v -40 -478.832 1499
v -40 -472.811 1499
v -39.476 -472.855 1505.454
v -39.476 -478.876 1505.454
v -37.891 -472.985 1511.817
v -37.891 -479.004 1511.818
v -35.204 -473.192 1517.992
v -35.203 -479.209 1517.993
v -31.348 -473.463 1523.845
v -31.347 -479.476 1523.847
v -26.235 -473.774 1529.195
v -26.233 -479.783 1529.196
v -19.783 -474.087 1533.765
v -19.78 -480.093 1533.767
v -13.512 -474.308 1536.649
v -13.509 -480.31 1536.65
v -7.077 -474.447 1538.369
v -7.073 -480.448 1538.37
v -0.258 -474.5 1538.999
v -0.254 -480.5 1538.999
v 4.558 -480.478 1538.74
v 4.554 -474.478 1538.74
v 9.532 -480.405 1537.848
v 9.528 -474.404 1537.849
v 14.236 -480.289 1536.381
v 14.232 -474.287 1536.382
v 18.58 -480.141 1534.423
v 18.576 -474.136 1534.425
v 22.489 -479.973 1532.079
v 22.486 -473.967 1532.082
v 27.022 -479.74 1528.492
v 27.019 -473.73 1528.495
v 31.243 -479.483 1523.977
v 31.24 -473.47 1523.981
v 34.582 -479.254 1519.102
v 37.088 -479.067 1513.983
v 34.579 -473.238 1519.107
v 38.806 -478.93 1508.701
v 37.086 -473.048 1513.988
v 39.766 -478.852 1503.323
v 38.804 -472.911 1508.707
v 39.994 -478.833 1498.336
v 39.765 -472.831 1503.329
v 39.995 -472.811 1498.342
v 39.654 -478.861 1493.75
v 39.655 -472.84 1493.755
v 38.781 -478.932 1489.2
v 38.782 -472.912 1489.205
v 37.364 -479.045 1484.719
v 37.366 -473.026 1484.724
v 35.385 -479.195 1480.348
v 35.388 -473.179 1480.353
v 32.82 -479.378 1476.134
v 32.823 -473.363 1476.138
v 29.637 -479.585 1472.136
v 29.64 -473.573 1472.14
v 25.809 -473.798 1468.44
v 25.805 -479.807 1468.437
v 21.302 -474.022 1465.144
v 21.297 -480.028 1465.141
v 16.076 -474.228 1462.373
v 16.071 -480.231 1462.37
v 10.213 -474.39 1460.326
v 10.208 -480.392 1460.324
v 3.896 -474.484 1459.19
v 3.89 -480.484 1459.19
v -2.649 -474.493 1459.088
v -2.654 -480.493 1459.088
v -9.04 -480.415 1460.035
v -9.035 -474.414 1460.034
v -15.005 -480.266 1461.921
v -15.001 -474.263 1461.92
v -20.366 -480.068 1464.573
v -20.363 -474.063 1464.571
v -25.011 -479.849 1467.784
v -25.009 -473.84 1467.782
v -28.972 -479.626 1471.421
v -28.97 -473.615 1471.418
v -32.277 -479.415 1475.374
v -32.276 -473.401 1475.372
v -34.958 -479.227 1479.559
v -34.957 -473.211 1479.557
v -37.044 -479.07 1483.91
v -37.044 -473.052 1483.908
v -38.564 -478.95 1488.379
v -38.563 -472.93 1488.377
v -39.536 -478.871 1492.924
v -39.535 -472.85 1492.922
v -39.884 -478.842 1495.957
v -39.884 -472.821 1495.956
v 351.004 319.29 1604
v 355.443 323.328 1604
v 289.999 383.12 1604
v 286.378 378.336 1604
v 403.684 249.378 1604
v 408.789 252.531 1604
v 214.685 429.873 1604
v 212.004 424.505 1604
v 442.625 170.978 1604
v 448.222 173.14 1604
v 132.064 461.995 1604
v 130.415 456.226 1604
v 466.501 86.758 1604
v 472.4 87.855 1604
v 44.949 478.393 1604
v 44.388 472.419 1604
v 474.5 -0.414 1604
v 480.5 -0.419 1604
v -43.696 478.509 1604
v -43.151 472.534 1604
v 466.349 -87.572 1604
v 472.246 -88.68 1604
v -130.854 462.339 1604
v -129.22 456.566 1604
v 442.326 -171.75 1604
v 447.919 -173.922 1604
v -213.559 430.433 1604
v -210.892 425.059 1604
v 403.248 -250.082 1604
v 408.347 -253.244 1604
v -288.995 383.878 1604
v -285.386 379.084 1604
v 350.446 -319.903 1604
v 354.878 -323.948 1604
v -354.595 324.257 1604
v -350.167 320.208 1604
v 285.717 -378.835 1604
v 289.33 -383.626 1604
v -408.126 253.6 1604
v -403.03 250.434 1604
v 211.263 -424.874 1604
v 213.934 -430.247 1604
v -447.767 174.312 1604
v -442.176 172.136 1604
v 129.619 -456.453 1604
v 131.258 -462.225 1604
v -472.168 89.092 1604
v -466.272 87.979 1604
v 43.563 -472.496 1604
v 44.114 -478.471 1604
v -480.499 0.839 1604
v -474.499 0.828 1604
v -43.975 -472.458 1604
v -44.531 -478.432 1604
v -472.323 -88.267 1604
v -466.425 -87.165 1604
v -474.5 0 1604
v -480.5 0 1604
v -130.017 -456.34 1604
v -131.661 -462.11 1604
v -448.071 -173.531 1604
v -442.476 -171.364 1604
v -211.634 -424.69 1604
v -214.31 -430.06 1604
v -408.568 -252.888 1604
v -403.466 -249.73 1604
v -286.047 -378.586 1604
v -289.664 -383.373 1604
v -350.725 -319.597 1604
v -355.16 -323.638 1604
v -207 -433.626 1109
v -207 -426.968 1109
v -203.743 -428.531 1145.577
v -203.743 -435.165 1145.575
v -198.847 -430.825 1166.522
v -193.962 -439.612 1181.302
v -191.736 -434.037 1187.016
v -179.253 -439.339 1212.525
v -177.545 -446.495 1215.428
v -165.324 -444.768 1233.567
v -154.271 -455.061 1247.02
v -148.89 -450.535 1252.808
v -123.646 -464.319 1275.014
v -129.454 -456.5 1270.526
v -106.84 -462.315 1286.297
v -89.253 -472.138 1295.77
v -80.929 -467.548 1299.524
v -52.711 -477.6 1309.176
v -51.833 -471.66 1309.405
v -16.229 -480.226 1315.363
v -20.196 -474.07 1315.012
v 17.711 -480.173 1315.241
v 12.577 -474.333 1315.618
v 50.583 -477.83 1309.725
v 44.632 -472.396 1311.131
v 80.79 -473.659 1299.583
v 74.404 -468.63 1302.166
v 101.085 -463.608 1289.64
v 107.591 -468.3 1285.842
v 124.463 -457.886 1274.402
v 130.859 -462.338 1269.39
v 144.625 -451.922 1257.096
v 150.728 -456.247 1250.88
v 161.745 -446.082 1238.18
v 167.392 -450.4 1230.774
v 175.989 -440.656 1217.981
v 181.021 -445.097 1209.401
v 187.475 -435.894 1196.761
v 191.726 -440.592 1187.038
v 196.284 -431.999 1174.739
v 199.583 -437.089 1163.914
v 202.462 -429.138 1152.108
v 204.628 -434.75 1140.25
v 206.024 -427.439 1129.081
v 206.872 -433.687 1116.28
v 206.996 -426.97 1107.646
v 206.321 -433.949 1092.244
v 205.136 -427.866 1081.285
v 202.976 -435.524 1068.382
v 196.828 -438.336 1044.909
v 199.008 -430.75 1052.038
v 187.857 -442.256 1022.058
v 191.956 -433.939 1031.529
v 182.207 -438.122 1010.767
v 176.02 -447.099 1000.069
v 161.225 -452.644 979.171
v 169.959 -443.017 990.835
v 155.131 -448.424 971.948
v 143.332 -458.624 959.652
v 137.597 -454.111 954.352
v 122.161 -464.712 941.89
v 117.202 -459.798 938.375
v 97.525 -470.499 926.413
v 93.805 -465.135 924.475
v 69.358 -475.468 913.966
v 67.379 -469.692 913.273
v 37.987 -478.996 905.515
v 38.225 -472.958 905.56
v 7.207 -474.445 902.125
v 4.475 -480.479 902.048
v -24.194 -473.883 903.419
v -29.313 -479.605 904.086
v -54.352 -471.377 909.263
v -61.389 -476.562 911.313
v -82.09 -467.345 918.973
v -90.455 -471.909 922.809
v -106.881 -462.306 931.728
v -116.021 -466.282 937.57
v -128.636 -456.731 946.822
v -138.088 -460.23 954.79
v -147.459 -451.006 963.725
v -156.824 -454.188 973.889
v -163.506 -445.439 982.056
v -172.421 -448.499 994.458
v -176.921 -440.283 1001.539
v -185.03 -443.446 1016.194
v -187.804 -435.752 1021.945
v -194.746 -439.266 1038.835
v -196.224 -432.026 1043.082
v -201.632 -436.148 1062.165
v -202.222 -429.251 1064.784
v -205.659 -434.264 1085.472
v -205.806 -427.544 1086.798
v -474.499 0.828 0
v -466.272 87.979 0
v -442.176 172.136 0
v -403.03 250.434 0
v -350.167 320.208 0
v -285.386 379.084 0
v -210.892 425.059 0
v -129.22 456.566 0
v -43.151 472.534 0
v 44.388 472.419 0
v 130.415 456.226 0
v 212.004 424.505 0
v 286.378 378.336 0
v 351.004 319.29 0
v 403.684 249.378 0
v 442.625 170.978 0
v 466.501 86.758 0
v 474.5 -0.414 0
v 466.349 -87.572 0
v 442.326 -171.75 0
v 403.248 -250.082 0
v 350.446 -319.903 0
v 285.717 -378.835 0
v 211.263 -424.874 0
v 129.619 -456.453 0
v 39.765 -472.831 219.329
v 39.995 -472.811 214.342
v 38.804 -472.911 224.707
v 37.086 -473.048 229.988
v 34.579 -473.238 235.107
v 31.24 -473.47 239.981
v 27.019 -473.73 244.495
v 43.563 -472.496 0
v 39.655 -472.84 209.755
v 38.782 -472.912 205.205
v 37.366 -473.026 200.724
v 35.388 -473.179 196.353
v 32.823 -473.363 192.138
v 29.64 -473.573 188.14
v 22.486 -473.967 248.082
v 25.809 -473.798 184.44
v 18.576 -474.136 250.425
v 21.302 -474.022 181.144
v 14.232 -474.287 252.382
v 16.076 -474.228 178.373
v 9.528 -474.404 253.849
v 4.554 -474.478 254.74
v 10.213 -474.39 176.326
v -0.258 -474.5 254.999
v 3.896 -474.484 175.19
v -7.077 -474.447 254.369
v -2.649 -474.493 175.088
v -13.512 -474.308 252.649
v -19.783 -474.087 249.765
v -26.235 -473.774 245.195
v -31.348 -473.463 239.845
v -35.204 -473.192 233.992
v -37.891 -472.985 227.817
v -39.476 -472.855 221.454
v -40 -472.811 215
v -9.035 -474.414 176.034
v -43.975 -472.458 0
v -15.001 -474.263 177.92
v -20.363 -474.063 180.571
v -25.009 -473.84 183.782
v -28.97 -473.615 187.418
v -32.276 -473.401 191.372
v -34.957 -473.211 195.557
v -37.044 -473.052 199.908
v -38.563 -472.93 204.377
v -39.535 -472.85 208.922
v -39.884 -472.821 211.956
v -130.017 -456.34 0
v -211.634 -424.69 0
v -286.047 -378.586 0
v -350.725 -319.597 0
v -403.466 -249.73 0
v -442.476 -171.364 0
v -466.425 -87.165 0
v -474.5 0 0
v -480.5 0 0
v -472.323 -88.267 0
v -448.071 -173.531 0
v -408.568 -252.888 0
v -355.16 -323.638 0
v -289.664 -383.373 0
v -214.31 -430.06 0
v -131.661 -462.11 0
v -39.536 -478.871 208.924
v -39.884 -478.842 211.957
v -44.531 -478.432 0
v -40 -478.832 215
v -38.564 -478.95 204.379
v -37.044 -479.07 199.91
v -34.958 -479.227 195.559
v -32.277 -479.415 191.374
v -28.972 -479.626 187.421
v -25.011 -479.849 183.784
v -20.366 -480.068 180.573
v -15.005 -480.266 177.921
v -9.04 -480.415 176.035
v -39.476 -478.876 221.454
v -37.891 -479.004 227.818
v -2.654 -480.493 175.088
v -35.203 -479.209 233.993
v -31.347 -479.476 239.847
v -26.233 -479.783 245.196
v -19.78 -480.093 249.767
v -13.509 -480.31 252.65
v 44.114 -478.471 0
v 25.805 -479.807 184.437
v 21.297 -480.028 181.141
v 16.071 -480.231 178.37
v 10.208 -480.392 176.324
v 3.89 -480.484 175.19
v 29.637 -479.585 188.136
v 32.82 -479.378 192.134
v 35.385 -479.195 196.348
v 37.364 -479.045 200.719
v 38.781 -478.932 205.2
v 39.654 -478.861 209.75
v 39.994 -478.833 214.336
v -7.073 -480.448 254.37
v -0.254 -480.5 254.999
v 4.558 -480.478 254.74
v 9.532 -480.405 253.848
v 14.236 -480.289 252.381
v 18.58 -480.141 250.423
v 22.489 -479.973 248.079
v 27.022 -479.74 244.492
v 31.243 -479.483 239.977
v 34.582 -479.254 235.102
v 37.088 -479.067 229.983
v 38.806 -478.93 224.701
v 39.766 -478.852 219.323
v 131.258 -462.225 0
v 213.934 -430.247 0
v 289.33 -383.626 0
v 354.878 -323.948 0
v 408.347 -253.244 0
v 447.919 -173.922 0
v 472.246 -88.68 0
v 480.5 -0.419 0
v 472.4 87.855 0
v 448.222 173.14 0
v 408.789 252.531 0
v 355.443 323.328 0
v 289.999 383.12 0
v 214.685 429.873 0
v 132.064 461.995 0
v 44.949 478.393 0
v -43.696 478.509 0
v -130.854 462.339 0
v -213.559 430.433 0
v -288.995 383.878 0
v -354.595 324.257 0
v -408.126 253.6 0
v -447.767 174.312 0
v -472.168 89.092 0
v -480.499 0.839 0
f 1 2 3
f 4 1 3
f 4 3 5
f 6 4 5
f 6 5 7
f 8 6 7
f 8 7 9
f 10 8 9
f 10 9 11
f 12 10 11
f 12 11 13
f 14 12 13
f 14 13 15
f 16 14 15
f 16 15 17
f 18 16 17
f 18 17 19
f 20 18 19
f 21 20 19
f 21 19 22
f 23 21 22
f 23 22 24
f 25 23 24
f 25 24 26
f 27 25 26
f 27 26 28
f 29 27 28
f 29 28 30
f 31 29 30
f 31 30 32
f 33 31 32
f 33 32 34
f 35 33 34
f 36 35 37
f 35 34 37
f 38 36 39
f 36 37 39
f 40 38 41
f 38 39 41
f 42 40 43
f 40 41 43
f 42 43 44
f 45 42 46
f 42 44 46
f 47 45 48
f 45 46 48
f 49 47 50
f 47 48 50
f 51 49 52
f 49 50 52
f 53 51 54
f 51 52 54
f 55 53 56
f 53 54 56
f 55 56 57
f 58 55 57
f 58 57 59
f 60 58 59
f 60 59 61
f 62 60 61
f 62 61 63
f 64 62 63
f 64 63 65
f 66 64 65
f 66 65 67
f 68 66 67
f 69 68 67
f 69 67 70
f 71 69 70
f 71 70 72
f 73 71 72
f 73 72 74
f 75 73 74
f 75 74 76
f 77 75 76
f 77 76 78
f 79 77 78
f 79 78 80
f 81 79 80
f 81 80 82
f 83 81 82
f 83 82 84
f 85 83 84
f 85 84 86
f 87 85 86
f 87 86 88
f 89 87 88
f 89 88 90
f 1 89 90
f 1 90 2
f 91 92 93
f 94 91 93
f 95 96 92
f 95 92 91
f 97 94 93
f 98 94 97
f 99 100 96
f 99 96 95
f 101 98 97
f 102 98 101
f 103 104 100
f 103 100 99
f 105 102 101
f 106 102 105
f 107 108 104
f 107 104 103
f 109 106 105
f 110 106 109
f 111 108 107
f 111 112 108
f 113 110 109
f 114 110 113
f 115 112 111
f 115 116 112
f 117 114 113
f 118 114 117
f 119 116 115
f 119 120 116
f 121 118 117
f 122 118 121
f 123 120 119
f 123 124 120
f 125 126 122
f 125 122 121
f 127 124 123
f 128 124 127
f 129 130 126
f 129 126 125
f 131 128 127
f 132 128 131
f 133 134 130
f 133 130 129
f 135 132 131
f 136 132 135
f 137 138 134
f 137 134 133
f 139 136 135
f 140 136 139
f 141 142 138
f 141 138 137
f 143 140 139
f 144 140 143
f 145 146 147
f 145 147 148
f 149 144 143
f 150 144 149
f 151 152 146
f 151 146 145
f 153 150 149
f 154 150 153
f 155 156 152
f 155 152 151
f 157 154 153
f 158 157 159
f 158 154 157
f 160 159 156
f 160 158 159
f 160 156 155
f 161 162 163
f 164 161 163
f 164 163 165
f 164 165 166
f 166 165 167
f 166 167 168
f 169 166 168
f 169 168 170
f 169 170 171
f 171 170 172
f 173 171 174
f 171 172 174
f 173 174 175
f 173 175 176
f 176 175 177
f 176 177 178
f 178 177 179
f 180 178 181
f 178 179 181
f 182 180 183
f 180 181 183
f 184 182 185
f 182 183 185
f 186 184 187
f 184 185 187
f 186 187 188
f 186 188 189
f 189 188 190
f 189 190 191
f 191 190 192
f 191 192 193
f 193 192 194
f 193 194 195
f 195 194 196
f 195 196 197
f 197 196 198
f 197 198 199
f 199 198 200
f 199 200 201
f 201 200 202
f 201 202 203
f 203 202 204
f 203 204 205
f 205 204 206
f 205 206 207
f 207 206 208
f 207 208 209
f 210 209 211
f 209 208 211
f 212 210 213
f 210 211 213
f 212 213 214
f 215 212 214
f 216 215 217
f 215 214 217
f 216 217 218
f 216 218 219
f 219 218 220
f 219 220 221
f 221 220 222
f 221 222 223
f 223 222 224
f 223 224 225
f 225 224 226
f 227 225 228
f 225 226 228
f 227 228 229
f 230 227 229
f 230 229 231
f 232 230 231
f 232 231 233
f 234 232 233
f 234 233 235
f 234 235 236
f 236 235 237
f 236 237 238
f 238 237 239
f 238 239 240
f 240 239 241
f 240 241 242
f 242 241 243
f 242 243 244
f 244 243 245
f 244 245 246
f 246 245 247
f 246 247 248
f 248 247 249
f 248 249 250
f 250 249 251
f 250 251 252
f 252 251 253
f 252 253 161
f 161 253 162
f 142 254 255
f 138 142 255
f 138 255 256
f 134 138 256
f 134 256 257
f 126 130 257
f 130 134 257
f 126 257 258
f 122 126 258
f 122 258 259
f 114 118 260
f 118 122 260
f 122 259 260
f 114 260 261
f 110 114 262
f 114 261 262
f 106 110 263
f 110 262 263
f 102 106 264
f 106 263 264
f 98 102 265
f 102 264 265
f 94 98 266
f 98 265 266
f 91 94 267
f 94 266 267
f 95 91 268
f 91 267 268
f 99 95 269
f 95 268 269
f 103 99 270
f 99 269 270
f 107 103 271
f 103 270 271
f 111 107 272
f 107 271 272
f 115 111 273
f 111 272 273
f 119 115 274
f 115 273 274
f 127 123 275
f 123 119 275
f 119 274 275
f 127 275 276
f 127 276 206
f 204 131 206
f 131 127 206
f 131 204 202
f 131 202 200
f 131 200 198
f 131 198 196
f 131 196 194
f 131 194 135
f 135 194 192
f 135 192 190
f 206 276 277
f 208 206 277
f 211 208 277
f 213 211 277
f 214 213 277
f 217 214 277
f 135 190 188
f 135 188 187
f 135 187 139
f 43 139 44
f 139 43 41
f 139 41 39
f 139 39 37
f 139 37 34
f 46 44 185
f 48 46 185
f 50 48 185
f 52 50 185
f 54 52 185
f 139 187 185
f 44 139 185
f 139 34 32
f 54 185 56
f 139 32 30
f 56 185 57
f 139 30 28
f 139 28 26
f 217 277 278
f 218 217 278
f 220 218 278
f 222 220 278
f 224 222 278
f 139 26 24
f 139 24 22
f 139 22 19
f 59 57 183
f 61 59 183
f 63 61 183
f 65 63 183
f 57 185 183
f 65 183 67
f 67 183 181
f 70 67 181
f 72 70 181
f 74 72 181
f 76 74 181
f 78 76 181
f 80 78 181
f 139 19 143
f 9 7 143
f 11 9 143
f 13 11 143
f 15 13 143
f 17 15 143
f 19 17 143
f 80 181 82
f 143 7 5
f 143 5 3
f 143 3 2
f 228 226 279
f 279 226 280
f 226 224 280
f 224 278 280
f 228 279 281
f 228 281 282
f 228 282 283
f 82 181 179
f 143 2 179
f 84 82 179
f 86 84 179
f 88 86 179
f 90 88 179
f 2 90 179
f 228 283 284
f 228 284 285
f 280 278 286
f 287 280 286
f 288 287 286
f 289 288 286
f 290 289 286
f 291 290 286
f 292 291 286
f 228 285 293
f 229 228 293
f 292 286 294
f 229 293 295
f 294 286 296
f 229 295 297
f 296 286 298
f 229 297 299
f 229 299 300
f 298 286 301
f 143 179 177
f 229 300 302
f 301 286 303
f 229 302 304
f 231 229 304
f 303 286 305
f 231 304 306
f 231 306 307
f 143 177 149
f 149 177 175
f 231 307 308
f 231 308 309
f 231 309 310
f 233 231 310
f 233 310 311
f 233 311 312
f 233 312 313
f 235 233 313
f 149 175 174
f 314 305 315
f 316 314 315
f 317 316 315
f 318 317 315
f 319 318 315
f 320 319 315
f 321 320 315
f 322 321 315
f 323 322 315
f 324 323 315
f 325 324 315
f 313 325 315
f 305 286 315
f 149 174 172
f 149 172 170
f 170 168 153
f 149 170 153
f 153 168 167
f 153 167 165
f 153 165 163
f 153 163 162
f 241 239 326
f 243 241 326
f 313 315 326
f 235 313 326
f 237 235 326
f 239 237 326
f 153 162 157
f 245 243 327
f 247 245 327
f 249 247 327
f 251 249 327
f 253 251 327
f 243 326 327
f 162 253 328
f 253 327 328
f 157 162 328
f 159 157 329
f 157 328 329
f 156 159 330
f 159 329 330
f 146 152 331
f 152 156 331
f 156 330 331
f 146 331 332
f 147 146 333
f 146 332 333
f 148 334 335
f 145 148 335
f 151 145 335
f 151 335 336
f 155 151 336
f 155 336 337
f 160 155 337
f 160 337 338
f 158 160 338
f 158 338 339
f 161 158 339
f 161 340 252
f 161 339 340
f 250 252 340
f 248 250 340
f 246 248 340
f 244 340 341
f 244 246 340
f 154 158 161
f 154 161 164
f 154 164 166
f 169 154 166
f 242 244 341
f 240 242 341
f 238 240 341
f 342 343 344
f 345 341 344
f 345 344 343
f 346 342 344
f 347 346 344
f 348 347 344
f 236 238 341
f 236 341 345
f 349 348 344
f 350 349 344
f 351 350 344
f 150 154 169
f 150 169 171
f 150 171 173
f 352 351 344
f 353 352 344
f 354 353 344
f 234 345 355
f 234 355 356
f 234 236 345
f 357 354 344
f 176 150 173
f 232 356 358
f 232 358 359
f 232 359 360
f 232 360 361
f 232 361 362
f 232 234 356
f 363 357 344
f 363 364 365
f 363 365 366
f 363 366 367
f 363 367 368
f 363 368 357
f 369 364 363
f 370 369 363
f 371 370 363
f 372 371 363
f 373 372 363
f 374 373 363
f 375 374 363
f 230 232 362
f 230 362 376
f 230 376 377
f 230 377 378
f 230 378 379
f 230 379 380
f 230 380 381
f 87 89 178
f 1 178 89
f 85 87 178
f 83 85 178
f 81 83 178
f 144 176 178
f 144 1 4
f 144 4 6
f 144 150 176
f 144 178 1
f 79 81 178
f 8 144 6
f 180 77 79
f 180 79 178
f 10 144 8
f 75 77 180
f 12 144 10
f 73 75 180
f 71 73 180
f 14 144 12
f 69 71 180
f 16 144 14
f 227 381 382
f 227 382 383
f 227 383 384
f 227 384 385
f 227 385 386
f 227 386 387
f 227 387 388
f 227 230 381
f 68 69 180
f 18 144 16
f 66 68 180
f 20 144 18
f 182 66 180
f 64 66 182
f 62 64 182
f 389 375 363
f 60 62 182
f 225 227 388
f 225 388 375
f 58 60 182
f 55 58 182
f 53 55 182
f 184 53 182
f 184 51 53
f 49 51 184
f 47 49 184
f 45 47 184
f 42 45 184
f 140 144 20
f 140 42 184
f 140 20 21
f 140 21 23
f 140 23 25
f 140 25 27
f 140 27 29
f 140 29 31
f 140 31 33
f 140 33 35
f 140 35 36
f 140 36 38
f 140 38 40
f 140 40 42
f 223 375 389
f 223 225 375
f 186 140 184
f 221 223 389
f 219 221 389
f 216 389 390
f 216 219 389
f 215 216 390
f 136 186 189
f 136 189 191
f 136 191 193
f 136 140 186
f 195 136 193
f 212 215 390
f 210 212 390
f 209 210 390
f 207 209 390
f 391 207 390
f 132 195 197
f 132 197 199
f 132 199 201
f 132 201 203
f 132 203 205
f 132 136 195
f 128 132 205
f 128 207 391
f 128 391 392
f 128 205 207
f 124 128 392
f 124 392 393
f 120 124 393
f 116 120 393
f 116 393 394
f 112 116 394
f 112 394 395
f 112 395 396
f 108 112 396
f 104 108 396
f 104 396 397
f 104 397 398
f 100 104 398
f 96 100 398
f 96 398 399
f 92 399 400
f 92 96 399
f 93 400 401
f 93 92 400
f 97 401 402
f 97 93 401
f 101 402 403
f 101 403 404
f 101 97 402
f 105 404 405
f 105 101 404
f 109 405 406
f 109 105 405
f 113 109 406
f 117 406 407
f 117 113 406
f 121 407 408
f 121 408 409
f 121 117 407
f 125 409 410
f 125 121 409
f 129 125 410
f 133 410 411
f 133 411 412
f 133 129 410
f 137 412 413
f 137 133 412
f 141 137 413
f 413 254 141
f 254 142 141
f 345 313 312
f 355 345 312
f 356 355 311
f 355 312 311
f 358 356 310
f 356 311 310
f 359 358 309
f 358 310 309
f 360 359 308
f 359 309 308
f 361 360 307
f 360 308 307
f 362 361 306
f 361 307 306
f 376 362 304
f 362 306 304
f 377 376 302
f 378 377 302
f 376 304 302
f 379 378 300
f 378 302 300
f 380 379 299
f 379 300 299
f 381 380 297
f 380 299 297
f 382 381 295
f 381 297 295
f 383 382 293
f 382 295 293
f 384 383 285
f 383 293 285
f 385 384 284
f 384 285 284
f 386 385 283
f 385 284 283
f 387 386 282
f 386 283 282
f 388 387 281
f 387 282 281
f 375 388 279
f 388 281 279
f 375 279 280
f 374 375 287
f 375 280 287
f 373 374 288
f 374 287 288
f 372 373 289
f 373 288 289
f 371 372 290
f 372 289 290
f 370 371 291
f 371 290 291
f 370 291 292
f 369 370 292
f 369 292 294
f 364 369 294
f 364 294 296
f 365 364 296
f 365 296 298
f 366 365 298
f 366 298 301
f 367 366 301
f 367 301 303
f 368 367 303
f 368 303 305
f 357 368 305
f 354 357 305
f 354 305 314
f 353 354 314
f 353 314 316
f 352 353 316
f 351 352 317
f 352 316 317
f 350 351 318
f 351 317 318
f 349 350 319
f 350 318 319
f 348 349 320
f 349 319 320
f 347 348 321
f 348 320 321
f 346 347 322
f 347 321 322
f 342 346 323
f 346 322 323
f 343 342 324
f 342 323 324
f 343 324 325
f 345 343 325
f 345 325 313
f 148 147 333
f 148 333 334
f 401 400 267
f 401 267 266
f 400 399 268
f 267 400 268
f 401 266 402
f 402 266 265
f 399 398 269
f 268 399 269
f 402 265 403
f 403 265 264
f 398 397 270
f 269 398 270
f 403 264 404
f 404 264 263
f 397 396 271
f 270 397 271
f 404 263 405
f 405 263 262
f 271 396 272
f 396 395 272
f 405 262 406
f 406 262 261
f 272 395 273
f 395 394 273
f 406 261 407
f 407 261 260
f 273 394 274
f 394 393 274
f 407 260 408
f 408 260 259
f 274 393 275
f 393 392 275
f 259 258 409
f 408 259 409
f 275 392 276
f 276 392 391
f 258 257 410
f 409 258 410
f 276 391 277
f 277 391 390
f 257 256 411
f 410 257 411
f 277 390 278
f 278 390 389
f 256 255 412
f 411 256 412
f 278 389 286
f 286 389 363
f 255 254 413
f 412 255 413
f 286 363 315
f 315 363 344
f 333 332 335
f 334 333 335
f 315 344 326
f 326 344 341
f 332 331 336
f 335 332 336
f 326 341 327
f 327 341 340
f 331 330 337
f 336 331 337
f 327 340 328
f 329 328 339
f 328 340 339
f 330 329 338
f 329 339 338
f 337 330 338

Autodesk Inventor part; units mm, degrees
ref_plane "YZ Plane" through (0, 0, 0) normal (1, 0, 0) x (0, 1, 0)
ref_plane "XZ Plane" through (0, 0, 0) normal (0, 1, 0) x (-1, 0, 0)
ref_plane "XY Plane" through (0, 0, 0) normal (0, 0, 1) x (1, 0, 0)
sketch "Sketch1" plane through (0, 0, 0) normal (0, 1, 0) x (-1, 0, 0)
  line L0 (480.5, 1604) -> (474.5, 1604)
  line L1 (474.5, 1604) -> (474.5, 0)
  line L2 (474.5, 0) -> (480.5, 0)
  line L3 (480.5, 0) -> (480.5, 1604)
  line L4 (0, 0) -> (0, 1673.0415)
  point P0 (477.5, 0)
  dimension "d0" = 6
  dimension "d1" = 1604
  dimension "d2" = 949
revolve "Revolution1" add sketch "Sketch1" angle 359.9 about axis through (0, 0, 0) along (0, 0, 1)
sketch "Sketch2" plane through (0, 0, 0) normal (0, 1, 0) x (-1, 0, 0)
  circle A0 centre (0, 1109) radius 207
  circle A1 centre (0, 215) radius 40
  circle A2 centre (0, 1499) radius 40
  line L0 (474.5, 1604) -> (-474.5, 1604) projected
  point P0 (0, 0)
  point P1 (474.4993, 1604)
  dimension "d4" = 414
  dimension "d5" = 80
  dimension "d6" = 80
  dimension "d7" = 215
  dimension "d8" = 105
  dimension "d9" = 495
extrude "Extrusion1" cut sketch "Sketch2" against normal through all
equation "\"d1\" = Высота_сред_части"
equation "\"d2\" = Внутр_Диам"
equation "\"d4\" = Внутр_диам_ревиз_окна"
equation "\"d5\" = Внешний_диам_трубы_подкл"
equation "\"d6\" = Внешний_диам_трубы_подкл"
equation "\"BendRadius\" = Thickness"
equation "\"BendReliefWidth\" = Thickness"
equation "\"BendReliefDepth\" = 0.5 * Thickness"
equation "\"CornerReliefSize\" = 4 * Thickness"
equation "\"MinimumRemnant\" = 2 * Thickness"
equation "\"TransitionRadius\" = BendRadius"
equation "\"JacobiRadiusSize\" = BendRadius"
equation "\"GapSize\" = Thickness"
equation "\"Высота_сред_части\" = 1604"
equation "\"Внутр_Диам\" = 949"
equation "\"Внутр_диам_ревиз_окна\" = 414"
equation "\"Внешний_диам_трубы_подкл\" = 80"
equation "\"Thickness\" = 6"
properties part number "Стенка фильтра D1000"
